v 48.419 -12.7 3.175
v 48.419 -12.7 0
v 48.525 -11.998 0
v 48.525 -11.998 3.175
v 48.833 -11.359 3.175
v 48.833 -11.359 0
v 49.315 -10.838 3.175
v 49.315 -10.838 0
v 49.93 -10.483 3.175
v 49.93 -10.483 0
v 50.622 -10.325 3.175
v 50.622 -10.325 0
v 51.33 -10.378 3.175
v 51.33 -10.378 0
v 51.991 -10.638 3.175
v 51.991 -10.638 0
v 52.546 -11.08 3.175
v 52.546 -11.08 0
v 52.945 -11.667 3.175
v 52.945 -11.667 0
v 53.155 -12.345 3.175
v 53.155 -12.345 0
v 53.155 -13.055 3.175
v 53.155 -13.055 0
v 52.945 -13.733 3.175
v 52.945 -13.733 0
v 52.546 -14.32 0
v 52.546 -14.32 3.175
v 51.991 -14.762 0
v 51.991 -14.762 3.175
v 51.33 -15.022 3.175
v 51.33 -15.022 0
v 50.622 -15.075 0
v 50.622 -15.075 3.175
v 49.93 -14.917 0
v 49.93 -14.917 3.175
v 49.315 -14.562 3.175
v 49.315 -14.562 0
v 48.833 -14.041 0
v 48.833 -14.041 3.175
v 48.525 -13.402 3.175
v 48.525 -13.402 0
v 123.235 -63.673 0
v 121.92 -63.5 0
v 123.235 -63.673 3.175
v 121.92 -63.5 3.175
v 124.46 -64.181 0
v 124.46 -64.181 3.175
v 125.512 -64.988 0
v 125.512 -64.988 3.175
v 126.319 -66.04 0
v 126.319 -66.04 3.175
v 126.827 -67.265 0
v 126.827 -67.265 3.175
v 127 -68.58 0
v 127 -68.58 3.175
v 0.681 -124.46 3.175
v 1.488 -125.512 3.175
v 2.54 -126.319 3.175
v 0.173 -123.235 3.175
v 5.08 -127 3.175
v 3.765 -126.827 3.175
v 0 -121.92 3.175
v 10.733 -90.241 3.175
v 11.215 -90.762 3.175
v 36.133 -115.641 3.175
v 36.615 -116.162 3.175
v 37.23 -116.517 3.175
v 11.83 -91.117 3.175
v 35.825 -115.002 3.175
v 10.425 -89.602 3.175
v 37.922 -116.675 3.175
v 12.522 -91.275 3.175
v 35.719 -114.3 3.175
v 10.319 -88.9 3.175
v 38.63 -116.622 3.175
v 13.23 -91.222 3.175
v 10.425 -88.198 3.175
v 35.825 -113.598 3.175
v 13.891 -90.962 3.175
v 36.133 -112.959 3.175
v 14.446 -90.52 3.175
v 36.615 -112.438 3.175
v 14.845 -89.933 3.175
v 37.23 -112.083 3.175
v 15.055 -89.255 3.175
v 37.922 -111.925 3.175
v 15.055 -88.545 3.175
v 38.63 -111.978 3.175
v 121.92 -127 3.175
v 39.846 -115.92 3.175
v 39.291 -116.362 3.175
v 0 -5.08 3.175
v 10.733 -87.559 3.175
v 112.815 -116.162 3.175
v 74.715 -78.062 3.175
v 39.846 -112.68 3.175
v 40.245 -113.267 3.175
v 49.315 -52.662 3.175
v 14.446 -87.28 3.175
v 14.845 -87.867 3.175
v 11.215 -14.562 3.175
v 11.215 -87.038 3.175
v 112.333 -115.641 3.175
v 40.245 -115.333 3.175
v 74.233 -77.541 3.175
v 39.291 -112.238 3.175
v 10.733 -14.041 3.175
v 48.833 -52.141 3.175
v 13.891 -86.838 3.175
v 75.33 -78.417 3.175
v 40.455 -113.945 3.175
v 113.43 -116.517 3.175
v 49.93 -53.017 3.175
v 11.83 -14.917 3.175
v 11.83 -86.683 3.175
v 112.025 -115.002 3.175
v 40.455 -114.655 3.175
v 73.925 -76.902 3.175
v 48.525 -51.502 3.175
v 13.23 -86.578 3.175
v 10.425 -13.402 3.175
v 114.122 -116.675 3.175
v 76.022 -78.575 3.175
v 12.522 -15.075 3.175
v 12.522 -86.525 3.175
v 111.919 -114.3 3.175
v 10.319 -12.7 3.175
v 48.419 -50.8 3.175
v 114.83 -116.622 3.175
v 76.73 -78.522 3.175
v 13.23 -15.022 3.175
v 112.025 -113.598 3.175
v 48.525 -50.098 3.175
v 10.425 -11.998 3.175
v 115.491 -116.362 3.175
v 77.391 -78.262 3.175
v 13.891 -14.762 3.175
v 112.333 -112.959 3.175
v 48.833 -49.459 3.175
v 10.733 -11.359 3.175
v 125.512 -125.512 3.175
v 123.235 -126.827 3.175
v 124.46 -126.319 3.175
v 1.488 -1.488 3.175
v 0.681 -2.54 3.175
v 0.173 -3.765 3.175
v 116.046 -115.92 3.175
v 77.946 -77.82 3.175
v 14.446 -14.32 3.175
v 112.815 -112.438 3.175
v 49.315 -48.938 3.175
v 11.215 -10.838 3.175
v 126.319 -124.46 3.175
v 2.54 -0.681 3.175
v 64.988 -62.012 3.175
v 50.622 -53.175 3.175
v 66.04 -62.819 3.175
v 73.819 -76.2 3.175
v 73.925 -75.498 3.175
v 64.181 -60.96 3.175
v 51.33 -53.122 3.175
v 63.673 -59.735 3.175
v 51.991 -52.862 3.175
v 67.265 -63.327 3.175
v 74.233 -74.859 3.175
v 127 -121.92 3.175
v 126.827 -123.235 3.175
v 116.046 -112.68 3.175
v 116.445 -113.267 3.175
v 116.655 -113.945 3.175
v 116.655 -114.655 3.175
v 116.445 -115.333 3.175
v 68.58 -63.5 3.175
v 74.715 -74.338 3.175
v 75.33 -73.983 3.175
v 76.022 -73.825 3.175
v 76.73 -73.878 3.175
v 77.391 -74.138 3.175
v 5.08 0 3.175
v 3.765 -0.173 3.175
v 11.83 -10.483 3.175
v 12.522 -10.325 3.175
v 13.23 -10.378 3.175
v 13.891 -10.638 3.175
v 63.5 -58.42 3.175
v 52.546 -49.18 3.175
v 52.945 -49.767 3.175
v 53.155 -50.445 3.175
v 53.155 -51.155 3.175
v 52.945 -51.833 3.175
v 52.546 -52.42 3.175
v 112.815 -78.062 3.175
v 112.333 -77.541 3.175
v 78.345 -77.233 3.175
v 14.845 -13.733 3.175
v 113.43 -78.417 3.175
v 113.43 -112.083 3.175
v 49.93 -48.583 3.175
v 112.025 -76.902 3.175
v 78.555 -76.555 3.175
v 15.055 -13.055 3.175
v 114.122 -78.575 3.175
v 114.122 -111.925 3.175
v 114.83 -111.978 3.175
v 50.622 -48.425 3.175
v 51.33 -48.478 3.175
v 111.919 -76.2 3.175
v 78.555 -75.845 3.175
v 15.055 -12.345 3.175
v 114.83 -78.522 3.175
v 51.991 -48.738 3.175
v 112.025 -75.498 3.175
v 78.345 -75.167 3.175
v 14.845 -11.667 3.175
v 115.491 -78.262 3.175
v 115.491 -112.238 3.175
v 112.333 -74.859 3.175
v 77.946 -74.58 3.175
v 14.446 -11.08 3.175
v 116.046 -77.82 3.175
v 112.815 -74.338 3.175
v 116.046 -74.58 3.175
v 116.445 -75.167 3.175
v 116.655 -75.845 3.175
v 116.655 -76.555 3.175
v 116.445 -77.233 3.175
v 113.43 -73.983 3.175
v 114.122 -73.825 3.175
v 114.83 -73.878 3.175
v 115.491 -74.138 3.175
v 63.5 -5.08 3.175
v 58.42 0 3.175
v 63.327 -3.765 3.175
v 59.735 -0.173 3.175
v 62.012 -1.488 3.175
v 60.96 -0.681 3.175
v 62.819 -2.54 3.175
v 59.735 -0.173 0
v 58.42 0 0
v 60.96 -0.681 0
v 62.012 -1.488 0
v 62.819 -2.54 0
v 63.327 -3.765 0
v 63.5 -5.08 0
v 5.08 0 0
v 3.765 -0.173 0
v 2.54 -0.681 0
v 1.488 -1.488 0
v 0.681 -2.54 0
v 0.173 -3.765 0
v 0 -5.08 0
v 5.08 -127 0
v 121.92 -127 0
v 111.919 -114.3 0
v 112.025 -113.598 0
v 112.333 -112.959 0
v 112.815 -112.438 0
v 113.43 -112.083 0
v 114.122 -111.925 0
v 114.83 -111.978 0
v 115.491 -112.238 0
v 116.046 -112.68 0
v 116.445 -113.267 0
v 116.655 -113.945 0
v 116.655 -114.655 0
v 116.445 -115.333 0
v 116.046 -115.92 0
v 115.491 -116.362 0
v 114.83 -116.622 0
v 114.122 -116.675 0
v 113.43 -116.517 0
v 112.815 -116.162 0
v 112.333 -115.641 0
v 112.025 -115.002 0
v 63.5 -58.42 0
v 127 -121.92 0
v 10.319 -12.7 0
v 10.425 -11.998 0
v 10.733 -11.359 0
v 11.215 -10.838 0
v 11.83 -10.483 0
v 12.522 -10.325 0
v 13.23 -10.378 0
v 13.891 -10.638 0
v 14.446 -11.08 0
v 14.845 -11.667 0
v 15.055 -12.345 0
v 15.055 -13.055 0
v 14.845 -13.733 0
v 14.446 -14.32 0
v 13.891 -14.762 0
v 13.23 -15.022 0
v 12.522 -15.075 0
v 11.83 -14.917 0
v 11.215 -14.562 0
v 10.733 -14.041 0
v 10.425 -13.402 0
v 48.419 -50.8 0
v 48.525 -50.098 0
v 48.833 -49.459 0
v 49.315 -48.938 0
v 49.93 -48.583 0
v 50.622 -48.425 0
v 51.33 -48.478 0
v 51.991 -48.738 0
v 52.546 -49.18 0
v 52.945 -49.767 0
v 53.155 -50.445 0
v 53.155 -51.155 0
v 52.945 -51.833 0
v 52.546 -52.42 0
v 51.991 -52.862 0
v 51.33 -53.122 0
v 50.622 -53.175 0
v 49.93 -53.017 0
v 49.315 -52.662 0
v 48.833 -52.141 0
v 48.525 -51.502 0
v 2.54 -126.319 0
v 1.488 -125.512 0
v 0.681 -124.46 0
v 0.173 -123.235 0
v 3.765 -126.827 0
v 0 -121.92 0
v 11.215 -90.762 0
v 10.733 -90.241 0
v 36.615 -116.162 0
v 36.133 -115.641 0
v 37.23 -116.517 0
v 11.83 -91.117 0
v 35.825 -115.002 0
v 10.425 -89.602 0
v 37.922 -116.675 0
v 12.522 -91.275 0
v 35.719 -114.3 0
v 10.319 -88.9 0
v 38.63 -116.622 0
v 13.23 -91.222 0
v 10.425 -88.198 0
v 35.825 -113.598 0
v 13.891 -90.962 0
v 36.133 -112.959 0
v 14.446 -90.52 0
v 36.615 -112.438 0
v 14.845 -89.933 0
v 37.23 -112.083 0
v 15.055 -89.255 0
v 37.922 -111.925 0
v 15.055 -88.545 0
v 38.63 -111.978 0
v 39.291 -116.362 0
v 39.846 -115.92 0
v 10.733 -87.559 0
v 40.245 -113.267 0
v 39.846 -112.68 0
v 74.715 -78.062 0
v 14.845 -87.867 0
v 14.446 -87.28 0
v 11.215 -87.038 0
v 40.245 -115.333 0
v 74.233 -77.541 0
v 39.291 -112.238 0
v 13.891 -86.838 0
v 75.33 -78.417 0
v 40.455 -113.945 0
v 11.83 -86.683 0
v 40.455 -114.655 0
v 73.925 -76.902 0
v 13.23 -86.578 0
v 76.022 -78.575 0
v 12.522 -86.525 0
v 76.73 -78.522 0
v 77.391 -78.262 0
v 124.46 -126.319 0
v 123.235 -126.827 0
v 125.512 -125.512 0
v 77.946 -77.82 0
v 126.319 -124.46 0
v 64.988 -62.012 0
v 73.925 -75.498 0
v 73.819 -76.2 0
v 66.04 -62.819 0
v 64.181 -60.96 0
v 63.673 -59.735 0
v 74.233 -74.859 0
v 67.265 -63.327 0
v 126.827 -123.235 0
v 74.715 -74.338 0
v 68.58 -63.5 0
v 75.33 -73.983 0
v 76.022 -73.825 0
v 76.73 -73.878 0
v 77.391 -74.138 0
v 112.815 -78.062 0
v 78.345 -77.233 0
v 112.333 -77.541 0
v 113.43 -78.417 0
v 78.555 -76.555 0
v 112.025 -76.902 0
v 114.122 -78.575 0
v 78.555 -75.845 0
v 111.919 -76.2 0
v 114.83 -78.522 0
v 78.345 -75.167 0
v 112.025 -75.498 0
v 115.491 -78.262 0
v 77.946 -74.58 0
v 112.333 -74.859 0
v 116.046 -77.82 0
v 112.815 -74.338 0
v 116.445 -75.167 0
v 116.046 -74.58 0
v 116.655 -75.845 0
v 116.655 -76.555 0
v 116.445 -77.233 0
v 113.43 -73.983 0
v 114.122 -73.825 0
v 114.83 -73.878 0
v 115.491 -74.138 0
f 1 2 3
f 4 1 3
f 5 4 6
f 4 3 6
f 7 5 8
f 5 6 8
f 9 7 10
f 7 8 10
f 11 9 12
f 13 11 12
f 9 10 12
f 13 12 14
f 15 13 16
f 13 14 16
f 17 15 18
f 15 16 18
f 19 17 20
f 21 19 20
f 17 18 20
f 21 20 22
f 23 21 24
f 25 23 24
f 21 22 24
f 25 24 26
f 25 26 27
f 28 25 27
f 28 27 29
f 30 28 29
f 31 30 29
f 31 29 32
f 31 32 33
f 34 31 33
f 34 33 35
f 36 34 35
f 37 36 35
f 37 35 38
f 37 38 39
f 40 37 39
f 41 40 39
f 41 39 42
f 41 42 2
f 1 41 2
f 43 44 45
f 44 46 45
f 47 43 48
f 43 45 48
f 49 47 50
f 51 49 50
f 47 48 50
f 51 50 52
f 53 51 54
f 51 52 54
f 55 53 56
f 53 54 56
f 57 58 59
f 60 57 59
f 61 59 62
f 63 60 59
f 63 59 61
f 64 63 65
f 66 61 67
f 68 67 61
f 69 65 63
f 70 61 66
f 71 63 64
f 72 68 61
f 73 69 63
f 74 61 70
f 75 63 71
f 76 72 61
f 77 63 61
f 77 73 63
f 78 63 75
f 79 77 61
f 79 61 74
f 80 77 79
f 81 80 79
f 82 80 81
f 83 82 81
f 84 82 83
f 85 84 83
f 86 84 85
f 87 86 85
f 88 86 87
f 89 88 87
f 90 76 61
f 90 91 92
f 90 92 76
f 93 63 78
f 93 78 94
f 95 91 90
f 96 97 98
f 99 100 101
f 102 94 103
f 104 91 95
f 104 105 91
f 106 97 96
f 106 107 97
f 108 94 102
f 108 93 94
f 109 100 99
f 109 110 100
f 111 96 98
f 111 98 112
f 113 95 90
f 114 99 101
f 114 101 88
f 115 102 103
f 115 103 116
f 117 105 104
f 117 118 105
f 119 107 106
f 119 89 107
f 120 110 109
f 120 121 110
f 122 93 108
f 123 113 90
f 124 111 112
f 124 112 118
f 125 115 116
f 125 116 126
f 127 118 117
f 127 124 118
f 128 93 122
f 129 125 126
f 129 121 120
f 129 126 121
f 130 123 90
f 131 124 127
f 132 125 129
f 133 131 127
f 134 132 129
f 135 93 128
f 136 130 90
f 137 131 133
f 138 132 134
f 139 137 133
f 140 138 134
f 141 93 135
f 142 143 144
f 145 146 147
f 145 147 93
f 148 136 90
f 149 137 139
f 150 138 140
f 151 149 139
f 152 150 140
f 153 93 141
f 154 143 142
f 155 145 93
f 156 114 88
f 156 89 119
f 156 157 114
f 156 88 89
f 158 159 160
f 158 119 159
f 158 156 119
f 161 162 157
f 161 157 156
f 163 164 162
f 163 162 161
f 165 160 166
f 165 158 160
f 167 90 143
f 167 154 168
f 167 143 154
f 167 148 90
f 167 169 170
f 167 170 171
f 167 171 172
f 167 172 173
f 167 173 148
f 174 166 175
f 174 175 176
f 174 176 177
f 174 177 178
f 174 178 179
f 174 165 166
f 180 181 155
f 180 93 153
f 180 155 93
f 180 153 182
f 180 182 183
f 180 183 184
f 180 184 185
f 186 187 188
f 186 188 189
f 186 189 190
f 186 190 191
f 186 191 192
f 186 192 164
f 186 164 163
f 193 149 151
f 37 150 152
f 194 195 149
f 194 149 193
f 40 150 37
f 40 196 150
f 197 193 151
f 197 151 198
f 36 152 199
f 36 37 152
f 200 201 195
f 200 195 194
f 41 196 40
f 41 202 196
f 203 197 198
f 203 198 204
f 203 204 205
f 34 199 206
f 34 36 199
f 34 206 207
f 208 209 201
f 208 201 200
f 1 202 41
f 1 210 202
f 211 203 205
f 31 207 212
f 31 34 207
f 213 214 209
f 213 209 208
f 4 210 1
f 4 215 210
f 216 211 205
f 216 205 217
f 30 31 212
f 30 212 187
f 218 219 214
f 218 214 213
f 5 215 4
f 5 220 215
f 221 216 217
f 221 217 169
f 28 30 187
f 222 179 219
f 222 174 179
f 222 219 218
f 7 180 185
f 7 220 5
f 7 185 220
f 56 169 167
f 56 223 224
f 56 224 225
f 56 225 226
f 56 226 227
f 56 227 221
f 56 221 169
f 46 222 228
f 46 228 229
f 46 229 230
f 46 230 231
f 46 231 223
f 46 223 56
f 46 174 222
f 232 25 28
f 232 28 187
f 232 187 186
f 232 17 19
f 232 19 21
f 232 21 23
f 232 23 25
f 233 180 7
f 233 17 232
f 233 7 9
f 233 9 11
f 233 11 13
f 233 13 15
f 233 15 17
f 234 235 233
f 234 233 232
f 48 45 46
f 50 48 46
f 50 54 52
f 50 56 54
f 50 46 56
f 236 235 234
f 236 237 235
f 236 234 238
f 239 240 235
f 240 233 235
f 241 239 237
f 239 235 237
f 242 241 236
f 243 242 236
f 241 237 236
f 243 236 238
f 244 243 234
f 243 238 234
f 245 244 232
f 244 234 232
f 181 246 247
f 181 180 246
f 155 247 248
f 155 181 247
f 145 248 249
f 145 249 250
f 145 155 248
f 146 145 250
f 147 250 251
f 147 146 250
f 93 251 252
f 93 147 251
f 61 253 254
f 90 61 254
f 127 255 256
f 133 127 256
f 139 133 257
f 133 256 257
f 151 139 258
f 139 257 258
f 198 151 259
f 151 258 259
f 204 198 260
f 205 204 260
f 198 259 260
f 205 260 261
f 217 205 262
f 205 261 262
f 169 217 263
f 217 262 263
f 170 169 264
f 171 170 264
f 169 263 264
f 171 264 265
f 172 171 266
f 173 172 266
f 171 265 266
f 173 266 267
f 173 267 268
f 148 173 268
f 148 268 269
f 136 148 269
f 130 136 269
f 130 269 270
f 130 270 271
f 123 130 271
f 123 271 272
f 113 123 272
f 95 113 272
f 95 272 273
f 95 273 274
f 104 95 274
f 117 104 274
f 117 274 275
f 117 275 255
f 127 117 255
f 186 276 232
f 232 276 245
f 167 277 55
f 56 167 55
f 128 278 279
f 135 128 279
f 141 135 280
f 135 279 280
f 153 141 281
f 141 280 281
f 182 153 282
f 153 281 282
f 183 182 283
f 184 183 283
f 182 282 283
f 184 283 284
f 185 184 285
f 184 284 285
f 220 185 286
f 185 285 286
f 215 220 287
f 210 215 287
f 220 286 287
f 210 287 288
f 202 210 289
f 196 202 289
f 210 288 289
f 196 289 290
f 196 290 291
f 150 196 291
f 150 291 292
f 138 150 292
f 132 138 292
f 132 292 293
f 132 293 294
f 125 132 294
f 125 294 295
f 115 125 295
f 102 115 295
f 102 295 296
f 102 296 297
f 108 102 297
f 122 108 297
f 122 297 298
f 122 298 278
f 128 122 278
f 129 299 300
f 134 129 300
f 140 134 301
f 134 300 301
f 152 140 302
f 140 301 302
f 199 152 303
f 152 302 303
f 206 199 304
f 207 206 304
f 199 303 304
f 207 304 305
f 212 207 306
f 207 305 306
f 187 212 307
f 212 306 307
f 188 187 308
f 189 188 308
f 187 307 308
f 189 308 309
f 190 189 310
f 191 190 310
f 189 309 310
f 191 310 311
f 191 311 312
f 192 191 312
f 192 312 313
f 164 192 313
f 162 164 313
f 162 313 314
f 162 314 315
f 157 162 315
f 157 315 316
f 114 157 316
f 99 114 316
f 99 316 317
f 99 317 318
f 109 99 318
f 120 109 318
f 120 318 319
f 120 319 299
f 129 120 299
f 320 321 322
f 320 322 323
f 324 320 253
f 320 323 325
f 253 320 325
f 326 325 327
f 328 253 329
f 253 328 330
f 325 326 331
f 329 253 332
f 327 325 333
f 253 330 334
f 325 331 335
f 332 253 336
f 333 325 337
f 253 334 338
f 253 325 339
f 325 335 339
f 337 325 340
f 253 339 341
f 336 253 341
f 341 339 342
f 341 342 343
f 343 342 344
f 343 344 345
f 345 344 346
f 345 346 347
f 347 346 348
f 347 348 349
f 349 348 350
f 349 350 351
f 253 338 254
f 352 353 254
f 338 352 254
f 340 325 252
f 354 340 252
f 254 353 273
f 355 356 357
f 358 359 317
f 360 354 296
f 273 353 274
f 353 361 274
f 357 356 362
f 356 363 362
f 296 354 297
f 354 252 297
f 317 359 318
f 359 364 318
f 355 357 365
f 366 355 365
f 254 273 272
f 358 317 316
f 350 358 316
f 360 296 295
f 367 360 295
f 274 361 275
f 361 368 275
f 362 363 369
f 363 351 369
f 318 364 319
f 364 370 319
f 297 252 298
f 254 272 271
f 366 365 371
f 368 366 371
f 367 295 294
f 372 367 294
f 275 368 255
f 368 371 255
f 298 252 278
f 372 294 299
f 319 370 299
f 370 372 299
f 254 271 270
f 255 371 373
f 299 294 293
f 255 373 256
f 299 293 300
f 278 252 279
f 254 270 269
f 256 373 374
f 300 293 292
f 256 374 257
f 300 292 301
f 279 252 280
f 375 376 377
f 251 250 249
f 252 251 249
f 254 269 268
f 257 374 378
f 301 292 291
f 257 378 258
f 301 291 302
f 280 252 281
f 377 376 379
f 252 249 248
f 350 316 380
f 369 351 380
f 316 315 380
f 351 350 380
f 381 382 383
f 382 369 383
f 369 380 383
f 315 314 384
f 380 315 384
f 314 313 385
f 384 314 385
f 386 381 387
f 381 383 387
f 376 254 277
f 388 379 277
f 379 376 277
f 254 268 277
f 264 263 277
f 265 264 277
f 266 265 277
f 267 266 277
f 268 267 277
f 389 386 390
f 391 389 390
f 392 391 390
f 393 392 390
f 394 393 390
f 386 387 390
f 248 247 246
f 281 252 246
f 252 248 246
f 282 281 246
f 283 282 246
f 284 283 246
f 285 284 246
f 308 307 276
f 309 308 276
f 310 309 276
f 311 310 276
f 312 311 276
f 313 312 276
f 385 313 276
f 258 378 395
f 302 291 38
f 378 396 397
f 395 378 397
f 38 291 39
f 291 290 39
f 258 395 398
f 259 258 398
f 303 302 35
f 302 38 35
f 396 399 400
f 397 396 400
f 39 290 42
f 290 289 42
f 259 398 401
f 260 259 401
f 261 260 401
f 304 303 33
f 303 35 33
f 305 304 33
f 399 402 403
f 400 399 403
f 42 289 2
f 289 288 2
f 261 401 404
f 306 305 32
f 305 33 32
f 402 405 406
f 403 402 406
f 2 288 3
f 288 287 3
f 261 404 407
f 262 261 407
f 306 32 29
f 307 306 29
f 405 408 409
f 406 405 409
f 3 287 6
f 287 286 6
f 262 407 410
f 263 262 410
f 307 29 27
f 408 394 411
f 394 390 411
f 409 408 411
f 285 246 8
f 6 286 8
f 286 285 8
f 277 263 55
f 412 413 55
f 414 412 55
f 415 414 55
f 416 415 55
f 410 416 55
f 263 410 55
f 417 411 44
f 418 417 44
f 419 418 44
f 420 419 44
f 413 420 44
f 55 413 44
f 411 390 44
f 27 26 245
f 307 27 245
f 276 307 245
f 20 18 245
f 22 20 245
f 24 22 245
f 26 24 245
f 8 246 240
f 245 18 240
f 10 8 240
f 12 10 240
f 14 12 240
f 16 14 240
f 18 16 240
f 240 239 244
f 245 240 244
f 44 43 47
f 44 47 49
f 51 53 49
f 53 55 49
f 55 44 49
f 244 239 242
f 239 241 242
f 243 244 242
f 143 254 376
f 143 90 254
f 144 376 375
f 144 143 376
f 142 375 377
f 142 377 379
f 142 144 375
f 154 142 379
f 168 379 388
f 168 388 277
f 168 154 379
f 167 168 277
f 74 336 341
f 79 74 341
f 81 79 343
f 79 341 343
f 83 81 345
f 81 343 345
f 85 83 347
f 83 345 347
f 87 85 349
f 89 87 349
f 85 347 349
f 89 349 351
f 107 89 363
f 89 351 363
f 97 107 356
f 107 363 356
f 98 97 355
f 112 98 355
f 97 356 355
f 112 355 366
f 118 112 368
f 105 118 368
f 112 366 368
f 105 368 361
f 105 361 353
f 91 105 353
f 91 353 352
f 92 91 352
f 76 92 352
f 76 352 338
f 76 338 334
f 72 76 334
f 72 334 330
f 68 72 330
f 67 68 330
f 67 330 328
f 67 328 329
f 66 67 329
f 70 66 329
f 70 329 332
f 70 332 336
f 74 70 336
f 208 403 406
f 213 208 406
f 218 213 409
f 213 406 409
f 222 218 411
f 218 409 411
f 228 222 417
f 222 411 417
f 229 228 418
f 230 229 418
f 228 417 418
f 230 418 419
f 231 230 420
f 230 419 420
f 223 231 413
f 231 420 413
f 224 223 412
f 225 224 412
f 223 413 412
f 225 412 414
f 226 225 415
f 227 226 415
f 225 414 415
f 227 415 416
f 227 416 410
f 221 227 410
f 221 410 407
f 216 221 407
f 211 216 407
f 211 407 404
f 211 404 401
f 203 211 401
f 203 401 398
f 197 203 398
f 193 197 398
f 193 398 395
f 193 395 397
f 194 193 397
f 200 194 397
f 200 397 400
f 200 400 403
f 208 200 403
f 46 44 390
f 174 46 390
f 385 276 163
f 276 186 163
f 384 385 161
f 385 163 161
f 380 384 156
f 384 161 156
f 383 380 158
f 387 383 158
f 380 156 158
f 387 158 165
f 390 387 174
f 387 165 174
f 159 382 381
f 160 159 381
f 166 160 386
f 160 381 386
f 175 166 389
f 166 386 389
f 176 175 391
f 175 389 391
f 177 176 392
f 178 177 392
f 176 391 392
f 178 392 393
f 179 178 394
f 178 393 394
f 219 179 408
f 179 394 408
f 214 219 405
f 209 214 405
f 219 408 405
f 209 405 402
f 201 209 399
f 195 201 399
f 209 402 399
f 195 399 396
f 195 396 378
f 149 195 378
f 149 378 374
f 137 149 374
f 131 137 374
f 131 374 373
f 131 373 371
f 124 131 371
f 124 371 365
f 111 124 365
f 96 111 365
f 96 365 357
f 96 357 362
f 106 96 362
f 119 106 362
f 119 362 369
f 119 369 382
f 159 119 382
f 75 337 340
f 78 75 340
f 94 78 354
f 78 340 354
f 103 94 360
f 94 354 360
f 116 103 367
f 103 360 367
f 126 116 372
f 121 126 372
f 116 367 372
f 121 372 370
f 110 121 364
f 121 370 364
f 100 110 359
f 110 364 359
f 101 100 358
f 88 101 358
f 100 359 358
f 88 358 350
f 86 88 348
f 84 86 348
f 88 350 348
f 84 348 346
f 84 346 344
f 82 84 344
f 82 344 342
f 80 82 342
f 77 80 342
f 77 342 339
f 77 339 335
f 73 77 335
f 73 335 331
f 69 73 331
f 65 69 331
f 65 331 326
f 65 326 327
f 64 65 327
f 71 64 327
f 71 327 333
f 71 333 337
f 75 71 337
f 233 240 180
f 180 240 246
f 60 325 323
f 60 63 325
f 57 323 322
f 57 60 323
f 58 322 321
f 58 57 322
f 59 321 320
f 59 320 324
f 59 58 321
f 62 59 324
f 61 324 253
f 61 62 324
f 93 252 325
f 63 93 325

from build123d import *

# Parameters (mm, degrees)
F1_DEPTH = 3.175
F3_D     = 4.7625
F4_R     = 5.08


with BuildPart() as f1:
    # F0 (on Top) → F1 (new body)
    with BuildSketch(Plane.XY):
        Polygon((63.5, 0), (0, 0), (0, -127), (127, -127), (127, -63.5), (63.5, -63.5), align=None)
    extrude(amount=F1_DEPTH)

    # F3 (through all)
    with Locations(Plane.XY.offset(3.175)):
        with Locations((12.7, -12.7), (50.8, -12.7), (50.8, -50.8), (12.7, -88.9), (38.1, -114.3), (76.2, -76.2), (114.3, -76.2), (114.3, -114.3)):
            Hole(F3_D / 2)

    # F4
    f4_edges = [f1.edges().sort_by_distance(p)[0] for p in [
        (63.5, -63.5, 1.5875),
        (63.5, 0, 1.5875),
        (0, 0, 1.5875),
        (127, -63.5, 1.5875),
        (127, -127, 1.5875),
        (0, -127, 1.5875),
    ]]
    fillet(f4_edges, radius=F4_R)


solid = f1.part
